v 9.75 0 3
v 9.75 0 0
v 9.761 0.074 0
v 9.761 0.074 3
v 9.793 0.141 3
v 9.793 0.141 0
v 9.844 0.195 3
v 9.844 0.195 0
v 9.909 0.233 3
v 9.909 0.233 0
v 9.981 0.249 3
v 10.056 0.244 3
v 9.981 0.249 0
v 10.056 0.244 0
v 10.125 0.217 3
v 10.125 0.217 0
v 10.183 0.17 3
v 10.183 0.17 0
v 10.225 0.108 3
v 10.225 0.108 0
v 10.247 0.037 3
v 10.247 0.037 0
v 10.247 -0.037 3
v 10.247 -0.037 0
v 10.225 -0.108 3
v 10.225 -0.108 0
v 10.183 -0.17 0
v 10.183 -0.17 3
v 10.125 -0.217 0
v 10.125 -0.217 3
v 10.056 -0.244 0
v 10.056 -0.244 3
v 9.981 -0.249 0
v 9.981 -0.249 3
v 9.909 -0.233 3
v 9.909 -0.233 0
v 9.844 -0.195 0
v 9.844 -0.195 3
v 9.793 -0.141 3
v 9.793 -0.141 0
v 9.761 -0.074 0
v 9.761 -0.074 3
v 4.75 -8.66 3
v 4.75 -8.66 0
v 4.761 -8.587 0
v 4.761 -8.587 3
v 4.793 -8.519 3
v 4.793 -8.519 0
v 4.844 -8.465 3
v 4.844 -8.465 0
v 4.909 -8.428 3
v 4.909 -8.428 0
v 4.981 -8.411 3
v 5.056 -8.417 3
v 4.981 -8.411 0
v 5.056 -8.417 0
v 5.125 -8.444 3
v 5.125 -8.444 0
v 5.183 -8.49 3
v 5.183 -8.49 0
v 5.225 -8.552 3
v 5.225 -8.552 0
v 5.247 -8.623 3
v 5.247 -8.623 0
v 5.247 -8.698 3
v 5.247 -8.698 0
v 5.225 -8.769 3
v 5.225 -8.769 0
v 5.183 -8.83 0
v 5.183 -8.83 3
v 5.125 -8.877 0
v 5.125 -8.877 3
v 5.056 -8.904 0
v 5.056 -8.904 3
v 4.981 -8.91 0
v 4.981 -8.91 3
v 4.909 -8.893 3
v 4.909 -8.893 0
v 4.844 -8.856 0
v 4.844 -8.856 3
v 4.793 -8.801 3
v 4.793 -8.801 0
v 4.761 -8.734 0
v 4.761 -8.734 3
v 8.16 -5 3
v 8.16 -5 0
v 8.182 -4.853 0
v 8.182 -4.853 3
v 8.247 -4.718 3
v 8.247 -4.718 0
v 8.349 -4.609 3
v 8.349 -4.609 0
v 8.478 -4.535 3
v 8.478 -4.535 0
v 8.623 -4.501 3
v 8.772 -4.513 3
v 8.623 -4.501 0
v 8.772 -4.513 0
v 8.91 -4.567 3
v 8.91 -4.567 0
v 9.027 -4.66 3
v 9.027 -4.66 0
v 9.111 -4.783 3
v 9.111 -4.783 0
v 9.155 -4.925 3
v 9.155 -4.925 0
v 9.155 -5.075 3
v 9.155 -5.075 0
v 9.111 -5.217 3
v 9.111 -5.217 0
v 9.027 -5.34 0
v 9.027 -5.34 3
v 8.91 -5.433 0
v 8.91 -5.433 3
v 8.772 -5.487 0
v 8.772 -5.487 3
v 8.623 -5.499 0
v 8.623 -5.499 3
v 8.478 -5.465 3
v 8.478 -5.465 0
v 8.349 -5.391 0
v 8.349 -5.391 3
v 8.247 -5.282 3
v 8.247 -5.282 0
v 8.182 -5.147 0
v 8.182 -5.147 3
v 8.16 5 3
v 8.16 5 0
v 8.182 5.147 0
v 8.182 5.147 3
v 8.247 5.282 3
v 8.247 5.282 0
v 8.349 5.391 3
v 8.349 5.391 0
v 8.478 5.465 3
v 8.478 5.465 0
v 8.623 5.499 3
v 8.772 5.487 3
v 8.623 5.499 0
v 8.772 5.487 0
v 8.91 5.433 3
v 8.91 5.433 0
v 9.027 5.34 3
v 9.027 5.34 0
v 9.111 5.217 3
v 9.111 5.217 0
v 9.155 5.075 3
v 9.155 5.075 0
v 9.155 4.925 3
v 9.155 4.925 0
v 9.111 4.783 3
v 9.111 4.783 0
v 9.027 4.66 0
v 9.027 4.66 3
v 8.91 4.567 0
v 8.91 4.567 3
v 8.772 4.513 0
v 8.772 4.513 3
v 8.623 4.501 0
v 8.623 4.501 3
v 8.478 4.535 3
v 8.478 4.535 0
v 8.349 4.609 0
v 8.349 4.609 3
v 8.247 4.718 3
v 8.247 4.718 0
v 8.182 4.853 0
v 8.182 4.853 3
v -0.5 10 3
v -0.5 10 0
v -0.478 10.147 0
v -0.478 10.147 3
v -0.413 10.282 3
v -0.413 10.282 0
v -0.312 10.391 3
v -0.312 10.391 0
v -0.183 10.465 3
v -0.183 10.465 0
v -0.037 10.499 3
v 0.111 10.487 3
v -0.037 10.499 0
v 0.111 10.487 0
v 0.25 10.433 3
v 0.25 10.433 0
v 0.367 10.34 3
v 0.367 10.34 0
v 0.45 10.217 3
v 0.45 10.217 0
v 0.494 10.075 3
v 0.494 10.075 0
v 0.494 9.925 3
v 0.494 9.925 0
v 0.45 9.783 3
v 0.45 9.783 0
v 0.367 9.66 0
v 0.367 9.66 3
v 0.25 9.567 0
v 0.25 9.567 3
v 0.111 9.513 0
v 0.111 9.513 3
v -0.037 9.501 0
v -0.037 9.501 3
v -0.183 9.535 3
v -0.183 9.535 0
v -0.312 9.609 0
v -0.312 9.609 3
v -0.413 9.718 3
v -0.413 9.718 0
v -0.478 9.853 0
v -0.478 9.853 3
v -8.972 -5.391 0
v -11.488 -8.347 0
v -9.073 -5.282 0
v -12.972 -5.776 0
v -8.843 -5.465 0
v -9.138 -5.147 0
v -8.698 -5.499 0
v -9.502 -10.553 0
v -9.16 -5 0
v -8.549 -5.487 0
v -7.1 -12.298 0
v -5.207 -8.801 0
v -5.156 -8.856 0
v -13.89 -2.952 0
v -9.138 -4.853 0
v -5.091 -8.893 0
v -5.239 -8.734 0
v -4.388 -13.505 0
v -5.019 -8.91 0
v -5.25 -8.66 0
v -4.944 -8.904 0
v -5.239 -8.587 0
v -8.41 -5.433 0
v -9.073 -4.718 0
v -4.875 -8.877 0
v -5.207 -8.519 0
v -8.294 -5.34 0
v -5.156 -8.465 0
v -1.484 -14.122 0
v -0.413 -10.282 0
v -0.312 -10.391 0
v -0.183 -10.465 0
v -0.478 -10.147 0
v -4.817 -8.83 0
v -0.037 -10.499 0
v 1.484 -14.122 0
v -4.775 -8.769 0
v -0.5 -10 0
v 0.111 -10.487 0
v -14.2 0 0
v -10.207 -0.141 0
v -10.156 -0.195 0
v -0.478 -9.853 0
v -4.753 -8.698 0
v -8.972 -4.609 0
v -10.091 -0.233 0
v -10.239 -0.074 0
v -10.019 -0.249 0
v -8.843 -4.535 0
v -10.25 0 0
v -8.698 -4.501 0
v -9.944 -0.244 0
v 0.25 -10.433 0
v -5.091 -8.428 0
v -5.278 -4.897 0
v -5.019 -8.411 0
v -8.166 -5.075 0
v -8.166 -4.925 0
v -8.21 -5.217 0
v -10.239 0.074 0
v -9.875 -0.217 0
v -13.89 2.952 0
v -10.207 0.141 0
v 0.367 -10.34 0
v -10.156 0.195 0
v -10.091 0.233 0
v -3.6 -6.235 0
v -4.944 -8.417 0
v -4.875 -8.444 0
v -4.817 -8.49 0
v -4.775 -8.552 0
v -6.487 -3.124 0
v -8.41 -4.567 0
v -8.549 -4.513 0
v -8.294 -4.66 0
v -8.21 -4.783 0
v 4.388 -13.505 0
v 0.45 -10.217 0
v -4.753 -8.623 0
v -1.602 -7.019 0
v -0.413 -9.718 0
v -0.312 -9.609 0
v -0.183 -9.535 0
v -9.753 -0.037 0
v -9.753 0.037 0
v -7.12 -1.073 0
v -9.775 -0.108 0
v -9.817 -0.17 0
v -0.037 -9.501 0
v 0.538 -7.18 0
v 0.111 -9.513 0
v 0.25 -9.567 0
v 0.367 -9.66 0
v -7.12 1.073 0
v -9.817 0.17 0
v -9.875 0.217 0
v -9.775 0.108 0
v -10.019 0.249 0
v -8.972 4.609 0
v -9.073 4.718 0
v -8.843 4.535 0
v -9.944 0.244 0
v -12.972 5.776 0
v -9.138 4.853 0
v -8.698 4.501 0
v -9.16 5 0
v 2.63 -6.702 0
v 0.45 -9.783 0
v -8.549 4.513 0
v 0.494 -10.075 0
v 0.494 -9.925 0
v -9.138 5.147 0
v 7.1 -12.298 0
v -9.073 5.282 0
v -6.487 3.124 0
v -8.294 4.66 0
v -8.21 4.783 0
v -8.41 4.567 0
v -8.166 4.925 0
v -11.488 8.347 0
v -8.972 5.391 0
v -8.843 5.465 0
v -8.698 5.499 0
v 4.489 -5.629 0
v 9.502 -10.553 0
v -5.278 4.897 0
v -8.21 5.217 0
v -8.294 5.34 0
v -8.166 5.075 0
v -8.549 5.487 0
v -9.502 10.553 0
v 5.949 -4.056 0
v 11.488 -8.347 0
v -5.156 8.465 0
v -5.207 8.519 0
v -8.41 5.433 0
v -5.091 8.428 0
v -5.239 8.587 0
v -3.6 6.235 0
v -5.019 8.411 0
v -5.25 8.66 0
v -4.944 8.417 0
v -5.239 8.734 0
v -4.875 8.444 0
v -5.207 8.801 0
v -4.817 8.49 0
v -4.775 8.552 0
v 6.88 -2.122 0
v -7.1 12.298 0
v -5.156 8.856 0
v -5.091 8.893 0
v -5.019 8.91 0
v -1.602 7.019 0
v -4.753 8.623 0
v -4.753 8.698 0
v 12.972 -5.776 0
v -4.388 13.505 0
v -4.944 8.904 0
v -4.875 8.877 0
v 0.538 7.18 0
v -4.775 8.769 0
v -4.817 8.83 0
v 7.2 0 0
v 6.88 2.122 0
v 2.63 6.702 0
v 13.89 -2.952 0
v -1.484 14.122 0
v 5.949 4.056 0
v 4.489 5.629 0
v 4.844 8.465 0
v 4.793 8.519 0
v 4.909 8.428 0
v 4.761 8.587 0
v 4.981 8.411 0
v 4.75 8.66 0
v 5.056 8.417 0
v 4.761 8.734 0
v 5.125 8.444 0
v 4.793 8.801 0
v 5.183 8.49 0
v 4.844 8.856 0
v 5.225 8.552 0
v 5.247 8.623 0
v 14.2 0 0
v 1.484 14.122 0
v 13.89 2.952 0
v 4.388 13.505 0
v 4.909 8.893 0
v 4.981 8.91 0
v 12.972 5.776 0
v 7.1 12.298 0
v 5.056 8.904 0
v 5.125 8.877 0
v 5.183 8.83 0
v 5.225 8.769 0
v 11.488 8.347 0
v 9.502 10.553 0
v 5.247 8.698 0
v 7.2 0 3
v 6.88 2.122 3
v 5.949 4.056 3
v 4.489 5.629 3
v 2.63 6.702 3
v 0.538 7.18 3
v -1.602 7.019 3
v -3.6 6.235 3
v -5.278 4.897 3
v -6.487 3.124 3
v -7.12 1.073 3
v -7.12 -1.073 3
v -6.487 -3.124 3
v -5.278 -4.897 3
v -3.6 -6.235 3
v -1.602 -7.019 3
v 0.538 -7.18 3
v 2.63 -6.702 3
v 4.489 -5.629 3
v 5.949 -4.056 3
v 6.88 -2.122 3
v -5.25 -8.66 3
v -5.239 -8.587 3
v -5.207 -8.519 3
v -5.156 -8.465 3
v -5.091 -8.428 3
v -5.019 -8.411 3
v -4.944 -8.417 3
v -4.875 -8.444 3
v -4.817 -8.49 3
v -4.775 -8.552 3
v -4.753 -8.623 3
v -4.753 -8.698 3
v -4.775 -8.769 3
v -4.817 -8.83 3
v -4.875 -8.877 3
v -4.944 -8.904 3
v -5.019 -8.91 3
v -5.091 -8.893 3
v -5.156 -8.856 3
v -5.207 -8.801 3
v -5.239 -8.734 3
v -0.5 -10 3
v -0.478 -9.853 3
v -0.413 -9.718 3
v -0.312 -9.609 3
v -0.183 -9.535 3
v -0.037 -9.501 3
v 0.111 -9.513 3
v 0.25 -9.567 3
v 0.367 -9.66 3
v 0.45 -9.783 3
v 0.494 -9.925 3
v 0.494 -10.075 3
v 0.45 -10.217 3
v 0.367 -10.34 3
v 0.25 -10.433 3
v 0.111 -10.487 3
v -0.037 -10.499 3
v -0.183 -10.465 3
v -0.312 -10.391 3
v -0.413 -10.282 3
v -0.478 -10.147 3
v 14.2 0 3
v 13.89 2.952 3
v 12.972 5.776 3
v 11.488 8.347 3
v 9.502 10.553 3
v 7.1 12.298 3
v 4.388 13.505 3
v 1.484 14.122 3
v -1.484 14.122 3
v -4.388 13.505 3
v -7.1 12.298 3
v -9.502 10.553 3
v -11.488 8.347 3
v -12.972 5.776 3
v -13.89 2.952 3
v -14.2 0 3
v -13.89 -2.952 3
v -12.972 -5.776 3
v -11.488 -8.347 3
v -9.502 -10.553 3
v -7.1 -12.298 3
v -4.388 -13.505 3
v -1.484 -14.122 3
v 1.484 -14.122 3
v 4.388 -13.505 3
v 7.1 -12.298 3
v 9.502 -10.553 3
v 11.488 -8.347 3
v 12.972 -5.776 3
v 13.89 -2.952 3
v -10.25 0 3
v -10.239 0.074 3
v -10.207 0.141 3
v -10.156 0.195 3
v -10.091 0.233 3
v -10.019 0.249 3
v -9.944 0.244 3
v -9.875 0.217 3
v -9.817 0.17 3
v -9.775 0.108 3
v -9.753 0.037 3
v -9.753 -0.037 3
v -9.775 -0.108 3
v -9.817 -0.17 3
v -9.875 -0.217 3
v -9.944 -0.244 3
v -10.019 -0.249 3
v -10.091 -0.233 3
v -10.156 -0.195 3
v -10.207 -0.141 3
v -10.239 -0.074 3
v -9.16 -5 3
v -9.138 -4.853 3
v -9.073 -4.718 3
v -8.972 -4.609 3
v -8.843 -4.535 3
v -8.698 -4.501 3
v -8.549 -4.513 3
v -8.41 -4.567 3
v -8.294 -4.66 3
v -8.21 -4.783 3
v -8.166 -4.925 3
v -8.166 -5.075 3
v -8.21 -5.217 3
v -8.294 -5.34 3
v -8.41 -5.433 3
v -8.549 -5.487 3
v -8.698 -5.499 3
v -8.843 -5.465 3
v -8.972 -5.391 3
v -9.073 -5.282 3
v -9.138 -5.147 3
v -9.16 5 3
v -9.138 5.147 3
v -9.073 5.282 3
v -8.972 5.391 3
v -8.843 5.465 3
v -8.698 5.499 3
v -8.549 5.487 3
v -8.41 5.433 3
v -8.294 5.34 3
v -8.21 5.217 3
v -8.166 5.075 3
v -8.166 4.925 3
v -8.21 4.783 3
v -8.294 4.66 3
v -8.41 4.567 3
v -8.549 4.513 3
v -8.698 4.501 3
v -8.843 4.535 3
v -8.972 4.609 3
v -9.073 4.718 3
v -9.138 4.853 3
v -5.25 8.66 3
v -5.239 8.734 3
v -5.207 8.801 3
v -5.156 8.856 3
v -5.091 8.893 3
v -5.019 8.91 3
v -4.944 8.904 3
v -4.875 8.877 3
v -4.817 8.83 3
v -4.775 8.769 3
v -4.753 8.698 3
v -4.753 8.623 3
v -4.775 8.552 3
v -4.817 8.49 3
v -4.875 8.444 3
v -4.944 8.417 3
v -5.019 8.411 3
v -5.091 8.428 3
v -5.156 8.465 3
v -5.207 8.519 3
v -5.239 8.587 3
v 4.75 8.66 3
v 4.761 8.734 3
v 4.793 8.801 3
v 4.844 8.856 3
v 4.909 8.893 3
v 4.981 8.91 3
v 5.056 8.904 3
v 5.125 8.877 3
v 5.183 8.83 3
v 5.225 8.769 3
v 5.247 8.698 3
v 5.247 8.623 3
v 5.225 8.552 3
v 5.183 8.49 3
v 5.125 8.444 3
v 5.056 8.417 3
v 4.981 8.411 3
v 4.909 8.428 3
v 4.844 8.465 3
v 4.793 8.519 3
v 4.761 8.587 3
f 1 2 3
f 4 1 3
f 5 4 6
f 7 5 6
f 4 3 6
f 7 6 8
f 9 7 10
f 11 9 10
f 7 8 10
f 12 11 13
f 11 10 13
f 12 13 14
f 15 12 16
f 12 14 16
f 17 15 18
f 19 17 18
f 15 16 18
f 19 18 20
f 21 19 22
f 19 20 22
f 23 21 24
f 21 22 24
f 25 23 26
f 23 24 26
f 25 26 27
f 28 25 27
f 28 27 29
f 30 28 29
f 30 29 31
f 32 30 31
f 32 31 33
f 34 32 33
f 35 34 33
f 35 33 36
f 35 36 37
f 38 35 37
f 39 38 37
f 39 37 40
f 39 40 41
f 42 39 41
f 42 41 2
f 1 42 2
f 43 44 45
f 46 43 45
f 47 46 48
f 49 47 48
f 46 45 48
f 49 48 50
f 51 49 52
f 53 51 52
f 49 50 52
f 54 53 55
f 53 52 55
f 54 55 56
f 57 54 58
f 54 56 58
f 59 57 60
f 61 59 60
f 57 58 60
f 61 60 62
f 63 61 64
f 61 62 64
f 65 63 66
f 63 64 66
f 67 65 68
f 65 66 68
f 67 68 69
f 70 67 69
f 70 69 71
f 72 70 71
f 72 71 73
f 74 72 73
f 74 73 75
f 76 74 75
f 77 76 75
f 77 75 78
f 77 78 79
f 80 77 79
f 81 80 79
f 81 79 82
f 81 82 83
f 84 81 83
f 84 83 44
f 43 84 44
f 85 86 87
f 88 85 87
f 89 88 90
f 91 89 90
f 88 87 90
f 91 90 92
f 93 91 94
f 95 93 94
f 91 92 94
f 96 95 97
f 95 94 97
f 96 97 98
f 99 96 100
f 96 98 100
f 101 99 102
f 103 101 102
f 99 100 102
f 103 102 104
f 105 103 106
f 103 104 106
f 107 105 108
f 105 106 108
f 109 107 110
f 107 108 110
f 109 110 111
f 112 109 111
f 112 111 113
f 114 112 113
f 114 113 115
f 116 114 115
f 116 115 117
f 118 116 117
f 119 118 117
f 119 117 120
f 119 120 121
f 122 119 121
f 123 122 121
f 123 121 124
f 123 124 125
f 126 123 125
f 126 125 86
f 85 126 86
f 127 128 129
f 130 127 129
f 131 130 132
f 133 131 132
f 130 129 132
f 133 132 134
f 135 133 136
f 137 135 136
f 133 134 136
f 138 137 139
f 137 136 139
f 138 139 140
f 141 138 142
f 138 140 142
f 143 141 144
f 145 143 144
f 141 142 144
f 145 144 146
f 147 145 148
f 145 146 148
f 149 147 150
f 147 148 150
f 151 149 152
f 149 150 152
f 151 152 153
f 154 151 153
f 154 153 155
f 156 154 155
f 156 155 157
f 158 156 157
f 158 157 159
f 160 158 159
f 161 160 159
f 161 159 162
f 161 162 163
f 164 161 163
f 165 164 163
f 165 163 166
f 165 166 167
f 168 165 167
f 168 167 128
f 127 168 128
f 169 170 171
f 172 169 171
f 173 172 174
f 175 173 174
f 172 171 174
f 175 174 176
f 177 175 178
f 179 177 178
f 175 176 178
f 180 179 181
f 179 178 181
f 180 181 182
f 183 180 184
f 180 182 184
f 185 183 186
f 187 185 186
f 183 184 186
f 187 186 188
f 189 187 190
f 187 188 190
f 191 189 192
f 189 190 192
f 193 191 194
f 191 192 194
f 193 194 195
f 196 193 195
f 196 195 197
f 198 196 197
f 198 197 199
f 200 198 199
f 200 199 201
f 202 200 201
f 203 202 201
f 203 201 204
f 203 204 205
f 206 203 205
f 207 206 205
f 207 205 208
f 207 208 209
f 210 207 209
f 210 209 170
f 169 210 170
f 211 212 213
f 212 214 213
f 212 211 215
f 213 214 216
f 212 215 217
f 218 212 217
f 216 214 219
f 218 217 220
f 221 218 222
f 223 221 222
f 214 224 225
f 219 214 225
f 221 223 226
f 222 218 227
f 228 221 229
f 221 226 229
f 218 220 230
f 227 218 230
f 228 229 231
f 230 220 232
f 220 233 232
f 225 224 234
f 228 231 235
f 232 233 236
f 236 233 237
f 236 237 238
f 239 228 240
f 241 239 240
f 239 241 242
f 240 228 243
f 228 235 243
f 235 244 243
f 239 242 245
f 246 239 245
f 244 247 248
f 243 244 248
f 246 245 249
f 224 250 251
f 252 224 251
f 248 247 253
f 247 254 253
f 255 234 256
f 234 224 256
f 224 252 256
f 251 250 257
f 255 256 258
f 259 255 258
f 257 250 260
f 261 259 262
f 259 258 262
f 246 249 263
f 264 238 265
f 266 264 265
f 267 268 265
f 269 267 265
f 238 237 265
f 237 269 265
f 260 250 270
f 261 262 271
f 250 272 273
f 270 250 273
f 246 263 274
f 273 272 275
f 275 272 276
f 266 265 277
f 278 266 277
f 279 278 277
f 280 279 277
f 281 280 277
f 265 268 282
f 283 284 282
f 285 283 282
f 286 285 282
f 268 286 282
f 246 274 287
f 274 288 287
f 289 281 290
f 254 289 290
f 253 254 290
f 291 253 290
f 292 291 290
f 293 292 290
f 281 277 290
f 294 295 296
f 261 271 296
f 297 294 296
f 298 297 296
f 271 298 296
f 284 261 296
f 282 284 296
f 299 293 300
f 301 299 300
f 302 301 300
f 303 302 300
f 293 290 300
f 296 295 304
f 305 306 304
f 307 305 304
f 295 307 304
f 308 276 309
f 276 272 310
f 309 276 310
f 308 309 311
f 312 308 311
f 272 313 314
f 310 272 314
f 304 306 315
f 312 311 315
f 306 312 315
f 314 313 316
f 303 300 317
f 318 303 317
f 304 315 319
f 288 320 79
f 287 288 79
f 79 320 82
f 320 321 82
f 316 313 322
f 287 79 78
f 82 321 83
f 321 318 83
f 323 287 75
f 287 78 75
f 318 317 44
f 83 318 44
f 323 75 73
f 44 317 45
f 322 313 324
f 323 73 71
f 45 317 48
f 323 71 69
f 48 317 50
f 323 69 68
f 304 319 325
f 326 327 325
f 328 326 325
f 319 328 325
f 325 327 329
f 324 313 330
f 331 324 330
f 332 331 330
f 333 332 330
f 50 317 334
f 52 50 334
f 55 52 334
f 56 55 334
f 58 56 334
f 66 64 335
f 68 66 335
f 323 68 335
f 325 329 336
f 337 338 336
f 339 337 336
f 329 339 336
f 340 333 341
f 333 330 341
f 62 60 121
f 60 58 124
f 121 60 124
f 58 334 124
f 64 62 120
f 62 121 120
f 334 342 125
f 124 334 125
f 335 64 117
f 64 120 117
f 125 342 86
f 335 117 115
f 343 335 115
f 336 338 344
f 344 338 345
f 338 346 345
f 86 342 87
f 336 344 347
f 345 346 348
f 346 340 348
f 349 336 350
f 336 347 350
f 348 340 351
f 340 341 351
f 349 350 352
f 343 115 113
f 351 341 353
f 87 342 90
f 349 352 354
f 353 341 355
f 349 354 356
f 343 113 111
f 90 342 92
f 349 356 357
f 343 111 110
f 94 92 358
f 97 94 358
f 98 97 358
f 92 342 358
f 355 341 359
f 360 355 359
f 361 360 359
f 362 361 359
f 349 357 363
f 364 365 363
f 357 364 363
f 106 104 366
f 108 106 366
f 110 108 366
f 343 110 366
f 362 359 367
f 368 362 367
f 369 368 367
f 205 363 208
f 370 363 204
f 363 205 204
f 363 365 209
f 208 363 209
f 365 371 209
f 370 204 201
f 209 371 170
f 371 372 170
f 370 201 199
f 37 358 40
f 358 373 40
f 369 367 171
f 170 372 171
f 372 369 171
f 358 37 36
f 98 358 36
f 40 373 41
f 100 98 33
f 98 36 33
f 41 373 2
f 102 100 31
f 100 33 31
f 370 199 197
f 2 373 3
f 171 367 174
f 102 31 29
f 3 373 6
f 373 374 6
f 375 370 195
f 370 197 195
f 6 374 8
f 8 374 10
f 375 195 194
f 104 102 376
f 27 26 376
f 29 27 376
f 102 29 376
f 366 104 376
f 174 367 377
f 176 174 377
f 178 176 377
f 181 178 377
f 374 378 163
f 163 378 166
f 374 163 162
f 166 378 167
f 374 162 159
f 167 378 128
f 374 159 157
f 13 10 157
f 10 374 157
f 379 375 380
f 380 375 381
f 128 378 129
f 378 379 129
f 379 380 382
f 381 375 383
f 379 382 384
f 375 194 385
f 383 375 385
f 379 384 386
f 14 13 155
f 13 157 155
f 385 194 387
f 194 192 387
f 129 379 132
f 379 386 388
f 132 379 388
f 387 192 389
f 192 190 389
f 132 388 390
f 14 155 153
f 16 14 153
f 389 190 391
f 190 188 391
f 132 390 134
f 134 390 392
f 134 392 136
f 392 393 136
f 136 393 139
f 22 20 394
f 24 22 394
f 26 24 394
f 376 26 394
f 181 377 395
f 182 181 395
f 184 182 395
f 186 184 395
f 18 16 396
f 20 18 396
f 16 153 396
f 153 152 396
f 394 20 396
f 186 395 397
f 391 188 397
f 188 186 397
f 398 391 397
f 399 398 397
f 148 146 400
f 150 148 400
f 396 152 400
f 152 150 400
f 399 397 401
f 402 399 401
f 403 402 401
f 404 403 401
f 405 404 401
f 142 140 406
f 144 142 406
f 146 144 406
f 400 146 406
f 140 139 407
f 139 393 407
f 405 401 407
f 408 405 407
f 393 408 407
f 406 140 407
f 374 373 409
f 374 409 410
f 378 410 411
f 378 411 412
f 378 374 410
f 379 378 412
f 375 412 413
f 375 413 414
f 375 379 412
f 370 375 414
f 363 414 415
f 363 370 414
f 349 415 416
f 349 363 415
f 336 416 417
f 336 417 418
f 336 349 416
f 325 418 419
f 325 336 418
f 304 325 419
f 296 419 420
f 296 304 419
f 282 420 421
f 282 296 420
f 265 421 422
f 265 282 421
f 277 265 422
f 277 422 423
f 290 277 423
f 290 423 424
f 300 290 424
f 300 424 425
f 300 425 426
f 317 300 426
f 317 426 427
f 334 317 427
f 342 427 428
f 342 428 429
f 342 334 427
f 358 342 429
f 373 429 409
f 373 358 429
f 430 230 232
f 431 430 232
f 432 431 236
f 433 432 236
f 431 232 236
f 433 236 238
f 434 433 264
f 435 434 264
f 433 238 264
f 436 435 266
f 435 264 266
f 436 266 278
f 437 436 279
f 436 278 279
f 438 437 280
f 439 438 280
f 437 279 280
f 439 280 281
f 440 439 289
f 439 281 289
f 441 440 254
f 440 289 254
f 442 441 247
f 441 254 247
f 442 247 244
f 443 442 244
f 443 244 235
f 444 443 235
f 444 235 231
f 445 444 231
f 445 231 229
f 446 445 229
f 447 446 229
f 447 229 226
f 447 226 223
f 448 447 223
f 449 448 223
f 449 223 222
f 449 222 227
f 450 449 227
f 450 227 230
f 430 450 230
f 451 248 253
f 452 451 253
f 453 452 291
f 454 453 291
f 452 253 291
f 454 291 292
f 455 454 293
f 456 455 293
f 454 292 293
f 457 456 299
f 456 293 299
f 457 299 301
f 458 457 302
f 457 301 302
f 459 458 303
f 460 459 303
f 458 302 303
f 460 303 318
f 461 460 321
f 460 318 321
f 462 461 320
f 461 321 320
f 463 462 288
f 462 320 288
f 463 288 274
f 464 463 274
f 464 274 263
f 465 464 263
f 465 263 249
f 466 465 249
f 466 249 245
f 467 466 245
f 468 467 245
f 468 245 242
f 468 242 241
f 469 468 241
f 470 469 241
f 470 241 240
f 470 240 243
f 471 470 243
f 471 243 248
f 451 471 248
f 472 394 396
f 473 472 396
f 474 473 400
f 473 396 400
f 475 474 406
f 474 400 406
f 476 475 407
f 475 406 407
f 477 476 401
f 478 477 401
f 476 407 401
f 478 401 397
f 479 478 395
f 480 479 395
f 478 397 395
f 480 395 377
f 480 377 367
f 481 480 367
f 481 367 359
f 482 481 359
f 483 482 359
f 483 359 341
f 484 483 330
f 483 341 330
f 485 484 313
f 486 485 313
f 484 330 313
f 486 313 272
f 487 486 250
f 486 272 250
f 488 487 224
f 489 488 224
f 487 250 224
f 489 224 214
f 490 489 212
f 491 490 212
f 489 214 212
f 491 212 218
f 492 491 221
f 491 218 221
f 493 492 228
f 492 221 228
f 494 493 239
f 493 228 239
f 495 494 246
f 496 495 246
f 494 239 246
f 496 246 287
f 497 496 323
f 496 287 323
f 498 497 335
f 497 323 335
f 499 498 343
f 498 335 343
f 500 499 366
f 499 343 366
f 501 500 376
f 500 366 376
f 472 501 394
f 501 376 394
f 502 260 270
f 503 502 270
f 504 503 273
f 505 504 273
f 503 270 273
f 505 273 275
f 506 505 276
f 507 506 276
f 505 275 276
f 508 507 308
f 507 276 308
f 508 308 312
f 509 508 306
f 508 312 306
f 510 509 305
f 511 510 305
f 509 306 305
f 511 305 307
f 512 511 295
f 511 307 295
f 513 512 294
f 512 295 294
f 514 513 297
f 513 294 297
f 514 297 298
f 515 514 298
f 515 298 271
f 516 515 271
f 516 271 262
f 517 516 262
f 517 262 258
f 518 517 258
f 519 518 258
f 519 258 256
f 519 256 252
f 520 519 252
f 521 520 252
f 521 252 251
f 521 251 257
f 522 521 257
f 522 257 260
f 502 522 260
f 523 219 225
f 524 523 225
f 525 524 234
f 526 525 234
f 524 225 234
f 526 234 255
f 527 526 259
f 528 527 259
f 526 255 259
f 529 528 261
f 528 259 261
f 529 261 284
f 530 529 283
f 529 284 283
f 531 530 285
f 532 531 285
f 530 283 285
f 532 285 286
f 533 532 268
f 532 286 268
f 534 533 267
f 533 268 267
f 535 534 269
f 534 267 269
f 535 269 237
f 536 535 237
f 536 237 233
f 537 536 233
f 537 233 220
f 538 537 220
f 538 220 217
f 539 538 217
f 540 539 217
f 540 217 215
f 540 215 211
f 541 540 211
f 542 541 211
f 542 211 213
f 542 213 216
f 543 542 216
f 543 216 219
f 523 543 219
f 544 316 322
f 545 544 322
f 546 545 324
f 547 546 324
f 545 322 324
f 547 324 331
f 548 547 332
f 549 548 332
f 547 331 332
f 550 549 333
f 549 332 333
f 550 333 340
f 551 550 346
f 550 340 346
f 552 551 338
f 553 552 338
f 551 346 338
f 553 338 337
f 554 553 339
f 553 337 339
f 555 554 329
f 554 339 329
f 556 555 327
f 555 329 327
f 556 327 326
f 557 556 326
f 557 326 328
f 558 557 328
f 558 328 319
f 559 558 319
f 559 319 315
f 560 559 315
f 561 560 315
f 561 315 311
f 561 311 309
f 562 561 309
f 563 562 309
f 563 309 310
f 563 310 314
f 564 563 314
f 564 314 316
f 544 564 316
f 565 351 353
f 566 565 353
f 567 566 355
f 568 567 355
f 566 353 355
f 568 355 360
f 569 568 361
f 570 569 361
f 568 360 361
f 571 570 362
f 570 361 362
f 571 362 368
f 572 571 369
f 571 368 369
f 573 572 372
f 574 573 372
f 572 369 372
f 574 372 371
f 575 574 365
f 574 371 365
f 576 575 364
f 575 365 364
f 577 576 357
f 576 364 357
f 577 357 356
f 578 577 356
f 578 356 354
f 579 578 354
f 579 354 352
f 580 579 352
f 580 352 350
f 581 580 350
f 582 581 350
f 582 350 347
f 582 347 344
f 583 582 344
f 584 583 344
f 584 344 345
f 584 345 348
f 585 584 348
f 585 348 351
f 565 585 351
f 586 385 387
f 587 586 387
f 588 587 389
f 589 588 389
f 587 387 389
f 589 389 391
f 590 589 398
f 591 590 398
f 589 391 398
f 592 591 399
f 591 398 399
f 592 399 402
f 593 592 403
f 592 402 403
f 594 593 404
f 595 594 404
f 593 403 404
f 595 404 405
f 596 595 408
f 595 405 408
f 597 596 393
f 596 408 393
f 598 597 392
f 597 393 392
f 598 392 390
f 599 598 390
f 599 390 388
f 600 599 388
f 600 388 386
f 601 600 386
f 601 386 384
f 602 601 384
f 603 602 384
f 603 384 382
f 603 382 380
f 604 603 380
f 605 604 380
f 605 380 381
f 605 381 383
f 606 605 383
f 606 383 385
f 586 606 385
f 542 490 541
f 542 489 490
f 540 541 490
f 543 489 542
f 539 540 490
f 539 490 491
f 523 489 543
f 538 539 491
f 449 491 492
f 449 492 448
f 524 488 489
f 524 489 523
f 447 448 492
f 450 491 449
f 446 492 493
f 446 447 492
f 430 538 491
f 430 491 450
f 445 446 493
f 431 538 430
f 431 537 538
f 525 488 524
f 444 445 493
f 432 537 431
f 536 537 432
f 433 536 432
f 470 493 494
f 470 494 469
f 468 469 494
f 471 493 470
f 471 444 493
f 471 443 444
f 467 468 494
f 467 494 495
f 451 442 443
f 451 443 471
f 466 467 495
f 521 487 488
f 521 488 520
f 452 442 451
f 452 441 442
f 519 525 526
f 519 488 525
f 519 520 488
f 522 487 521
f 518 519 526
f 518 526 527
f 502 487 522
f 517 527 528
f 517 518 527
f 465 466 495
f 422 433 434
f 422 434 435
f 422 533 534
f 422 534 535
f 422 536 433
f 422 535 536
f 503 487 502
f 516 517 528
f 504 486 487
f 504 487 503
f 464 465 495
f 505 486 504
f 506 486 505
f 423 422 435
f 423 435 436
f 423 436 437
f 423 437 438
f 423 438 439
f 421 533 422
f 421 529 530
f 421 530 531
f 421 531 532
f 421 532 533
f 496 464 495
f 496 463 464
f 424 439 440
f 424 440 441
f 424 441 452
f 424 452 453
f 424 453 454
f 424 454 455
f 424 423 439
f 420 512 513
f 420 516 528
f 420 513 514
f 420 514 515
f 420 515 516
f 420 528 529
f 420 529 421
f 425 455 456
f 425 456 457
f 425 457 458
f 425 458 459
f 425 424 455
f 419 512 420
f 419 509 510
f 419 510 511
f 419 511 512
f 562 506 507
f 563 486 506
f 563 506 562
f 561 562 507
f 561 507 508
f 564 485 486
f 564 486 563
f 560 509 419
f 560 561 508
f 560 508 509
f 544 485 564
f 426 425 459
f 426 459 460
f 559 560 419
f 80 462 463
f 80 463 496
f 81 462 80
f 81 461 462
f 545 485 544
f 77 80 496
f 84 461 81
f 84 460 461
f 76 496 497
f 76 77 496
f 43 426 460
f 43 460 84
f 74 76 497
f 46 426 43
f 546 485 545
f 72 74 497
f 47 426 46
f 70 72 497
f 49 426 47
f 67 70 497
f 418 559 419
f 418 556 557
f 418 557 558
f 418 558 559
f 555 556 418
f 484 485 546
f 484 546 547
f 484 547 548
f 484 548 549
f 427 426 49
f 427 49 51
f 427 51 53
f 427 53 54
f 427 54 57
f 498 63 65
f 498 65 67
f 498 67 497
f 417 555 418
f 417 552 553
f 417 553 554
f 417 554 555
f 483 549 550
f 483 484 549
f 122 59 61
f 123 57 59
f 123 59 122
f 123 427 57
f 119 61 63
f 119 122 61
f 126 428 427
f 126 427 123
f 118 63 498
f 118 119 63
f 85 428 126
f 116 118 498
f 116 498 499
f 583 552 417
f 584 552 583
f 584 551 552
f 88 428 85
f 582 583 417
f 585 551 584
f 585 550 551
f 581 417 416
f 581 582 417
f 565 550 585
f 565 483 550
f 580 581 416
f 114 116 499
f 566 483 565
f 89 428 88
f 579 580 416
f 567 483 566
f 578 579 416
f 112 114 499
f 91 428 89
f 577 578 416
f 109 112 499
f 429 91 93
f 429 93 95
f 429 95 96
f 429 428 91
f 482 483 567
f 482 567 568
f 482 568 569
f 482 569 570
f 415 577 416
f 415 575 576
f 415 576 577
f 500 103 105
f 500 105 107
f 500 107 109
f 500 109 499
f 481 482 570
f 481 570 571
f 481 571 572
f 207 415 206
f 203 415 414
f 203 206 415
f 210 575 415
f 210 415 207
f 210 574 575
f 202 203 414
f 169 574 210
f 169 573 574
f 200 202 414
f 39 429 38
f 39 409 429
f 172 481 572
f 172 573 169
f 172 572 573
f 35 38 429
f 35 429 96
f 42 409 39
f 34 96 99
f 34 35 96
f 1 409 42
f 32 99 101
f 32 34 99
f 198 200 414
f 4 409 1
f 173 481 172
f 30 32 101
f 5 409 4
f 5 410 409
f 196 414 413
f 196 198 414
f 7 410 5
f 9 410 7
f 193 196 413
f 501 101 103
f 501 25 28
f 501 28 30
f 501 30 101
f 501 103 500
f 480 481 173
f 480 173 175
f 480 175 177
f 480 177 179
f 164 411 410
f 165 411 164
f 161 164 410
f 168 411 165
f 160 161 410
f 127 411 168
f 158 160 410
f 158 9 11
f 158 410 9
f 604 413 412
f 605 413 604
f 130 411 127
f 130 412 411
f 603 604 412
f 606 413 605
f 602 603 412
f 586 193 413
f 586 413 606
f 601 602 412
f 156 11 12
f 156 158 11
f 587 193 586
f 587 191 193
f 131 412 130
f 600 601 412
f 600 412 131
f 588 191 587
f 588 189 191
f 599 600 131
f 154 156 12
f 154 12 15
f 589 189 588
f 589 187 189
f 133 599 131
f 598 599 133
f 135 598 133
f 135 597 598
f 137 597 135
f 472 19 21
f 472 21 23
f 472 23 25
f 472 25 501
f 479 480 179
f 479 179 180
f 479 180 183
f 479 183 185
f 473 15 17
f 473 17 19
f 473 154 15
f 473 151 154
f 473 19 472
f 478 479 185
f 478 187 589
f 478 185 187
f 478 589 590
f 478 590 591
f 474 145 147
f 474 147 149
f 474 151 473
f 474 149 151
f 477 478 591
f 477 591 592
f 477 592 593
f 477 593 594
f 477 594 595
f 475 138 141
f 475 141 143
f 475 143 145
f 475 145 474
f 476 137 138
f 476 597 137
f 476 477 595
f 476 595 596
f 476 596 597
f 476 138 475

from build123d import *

# Parameters (mm, degrees)
F0_R     = 14.2
F0_R_2   = 7.2
F1_DEPTH = 3
F3_D     = 1
F5_D     = 0.5


with BuildPart() as f1:
    # F0 (on Top) → F1 (new body)
    with BuildSketch(Plane.XY):
        Circle(F0_R)
        Circle(F0_R_2, mode=Mode.SUBTRACT)
    extrude(amount=F1_DEPTH)

    # F3 (through all)
    with Locations(Plane.XY.offset(3)):
        with Locations((0, 10), (8.660254, 5), (8.660254, -5), (0, -10), (-8.660254, 5), (-8.660254, -5)):
            Hole(F3_D / 2)

    # F5 (through all)
    with Locations(Plane.XY.offset(3)):
        with Locations((-5, 8.660254), (5, 8.660254), (10, 0), (5, -8.660254), (-5, -8.660254), (-10, 0)):
            Hole(F5_D / 2)


solid = f1.part
